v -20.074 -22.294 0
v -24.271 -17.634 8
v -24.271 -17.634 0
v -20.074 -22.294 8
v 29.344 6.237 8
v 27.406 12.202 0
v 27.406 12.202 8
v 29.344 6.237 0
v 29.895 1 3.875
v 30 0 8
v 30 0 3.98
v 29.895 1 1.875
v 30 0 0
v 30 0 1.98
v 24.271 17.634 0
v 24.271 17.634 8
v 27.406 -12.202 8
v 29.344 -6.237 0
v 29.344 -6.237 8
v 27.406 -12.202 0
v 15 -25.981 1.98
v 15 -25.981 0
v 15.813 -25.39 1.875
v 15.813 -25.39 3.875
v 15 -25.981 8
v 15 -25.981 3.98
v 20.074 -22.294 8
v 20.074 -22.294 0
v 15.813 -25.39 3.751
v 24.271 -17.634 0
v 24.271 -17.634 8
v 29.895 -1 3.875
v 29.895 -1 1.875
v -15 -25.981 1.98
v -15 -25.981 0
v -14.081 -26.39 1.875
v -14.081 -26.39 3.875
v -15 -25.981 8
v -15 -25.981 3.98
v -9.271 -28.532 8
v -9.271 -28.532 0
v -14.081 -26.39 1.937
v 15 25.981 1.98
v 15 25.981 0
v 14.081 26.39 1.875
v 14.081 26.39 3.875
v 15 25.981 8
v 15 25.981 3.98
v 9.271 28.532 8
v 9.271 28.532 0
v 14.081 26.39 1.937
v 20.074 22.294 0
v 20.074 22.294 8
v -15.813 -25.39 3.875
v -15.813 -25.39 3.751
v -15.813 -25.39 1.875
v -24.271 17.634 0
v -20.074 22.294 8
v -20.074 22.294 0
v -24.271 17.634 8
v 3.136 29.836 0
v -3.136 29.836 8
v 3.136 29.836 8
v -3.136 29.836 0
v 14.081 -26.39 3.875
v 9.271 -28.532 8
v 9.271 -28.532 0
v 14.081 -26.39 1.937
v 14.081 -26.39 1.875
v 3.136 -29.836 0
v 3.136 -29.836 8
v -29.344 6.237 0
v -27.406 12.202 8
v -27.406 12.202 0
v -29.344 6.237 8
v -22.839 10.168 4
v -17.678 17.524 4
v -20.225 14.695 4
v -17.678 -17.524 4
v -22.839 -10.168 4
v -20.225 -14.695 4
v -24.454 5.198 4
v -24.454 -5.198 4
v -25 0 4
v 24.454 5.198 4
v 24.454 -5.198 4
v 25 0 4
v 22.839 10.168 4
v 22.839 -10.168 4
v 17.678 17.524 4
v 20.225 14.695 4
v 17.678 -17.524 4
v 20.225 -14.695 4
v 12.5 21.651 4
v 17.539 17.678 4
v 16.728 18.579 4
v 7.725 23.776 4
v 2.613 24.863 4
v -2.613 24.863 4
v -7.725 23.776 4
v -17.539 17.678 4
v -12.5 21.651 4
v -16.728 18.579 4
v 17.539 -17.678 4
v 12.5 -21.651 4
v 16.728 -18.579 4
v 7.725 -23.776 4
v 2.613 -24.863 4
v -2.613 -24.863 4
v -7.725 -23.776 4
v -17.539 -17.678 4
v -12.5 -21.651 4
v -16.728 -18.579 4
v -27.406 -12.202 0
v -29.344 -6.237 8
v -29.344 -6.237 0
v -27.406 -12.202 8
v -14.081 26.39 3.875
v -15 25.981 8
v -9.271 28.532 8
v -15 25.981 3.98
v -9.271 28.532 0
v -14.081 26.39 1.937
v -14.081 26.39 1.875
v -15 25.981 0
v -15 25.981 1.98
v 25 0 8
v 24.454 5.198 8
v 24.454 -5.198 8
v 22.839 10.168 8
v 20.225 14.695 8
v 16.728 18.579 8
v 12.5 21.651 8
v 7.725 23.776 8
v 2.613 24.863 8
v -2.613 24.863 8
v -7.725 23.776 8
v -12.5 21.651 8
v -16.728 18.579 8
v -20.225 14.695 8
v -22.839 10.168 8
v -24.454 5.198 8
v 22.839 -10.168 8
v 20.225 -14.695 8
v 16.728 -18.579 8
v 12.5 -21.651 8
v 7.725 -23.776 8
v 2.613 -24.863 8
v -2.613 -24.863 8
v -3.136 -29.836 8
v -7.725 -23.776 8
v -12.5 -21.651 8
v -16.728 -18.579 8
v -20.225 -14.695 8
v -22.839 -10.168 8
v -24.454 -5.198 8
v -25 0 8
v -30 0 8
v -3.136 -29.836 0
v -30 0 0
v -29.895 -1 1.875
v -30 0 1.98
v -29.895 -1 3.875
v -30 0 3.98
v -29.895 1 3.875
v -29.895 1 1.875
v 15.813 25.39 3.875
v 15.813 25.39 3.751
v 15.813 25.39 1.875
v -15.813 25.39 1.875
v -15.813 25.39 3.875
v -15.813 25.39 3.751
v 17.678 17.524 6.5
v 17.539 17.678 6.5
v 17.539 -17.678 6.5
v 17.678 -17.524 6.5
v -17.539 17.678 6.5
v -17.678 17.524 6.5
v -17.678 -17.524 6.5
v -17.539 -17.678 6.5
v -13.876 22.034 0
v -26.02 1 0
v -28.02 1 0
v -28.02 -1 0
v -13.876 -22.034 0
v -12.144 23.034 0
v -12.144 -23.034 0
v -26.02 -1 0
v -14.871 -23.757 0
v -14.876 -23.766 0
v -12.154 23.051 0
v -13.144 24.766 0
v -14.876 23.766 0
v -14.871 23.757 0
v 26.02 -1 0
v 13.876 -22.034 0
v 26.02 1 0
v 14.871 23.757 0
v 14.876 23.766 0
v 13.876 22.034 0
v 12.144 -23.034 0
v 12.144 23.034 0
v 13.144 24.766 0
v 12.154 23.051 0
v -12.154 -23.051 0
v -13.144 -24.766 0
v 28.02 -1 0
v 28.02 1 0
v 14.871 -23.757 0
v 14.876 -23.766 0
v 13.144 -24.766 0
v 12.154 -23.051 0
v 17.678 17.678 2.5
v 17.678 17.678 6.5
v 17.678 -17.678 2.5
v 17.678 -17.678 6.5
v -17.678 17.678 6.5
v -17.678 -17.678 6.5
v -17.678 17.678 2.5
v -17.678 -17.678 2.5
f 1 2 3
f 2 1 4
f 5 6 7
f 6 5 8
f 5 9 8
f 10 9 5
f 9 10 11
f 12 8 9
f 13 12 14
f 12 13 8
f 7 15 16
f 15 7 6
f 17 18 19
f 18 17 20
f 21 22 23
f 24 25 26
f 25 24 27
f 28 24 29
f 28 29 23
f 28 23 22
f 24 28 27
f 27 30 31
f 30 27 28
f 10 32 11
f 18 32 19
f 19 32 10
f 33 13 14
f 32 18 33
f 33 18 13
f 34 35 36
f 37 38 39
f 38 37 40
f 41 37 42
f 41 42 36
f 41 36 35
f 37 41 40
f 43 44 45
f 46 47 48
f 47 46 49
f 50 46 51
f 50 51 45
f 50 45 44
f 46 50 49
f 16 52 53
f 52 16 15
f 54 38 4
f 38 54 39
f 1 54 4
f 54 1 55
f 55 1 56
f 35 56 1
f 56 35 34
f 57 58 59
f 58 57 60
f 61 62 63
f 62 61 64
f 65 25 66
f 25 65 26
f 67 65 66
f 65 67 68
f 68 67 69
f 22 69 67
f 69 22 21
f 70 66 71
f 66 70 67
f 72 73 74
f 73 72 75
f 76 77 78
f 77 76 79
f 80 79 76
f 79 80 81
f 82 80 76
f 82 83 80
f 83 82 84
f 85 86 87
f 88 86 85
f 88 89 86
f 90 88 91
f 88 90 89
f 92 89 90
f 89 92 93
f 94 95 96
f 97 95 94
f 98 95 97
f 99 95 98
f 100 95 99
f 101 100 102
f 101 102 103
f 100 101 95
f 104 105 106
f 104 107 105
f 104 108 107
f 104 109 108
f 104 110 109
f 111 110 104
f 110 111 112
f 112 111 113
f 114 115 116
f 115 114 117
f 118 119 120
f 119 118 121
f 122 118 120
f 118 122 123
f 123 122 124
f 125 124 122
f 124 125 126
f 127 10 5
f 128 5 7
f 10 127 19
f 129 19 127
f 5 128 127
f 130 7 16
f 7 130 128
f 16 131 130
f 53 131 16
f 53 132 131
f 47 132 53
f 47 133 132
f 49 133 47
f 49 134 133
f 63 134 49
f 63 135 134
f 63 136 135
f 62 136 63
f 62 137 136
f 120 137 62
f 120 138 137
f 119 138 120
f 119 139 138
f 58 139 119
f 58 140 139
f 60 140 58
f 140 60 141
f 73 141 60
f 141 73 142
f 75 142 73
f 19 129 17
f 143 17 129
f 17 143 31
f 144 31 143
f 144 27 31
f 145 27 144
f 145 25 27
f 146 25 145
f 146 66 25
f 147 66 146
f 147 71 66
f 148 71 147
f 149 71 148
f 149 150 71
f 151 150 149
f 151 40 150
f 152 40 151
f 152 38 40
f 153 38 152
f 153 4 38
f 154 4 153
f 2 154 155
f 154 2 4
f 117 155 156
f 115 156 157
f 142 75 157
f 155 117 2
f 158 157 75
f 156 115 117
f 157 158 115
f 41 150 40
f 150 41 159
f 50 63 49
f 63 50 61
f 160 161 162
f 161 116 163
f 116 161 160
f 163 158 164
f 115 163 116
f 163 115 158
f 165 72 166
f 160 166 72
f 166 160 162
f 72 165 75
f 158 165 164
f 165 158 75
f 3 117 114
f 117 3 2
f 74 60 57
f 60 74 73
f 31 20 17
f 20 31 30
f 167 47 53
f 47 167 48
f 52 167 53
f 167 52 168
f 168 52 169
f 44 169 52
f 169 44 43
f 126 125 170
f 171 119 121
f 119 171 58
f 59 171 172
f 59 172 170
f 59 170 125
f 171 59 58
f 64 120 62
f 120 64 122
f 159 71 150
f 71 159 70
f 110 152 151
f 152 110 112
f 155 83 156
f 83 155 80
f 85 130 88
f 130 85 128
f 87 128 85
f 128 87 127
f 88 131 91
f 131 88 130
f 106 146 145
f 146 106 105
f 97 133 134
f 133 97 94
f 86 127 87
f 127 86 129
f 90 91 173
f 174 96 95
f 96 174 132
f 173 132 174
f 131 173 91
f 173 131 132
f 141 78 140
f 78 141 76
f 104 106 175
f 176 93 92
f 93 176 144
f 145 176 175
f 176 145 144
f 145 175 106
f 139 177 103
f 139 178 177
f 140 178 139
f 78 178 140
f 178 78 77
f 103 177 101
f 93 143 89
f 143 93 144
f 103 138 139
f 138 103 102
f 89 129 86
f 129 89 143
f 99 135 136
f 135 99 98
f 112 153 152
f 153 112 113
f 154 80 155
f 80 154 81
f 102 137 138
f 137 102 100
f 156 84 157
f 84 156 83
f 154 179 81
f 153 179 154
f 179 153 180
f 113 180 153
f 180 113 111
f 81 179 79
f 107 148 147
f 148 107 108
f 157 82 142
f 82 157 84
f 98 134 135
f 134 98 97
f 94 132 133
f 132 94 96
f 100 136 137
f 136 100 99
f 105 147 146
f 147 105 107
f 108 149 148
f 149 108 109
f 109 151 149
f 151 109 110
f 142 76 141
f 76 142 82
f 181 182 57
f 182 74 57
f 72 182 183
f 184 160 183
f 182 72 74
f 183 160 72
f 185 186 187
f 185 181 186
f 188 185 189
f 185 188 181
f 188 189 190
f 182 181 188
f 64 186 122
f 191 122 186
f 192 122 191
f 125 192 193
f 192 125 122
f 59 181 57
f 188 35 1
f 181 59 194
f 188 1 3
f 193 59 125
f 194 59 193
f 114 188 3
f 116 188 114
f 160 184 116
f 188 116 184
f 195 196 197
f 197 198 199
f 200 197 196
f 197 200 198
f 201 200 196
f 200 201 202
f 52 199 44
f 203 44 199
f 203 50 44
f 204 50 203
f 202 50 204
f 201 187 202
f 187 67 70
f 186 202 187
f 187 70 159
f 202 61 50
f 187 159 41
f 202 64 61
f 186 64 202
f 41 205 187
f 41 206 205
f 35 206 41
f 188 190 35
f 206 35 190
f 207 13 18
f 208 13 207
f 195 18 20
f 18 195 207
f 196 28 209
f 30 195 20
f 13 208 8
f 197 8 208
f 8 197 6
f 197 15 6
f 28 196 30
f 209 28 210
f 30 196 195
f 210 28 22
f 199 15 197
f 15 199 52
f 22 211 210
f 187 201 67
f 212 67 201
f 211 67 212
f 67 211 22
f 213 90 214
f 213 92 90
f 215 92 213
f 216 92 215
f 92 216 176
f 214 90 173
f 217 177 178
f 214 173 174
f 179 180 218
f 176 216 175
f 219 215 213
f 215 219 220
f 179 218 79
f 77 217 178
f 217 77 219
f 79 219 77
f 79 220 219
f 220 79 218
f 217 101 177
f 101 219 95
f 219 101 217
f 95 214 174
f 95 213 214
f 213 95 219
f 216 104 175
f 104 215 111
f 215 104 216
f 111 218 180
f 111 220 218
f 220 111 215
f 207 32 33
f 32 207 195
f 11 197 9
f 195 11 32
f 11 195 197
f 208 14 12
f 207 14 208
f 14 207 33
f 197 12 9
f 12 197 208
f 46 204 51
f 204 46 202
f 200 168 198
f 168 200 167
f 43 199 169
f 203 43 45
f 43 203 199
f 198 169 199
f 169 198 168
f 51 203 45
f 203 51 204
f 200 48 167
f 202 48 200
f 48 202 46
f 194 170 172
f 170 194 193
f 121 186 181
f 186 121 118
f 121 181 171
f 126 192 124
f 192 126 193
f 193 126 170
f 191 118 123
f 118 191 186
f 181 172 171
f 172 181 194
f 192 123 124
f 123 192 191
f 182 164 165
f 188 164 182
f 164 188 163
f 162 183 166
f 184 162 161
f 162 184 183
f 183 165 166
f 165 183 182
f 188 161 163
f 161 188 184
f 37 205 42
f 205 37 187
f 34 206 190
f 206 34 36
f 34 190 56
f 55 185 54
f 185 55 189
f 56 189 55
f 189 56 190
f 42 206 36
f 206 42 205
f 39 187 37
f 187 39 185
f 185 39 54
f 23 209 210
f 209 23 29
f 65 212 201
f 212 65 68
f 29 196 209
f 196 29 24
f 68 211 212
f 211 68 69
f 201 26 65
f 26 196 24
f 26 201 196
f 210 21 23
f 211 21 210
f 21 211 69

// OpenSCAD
// file: ../src/util.scad
//Данная функция корректно смещает slc_ear и sqr_ear 
//под нужный радиус окружности.
module radiused(radius,offset) {
    ystate = sqrt(radius*radius - offset*offset);
    translate([0,ystate,0]) children(0);
}

module linear_array(length, total) {
    for(x = [0:length/(total - 1):length])
        translate([x,0,0]) children(0);
}

module mirror_copy(vector) {
    union() {
        mirror(vector) children(0);
        children(0);
    }
}
// file: ../src/symbol.scad
//Данный модуль строит 3д символ компании (image/symbol.png) 
module symbol(x,y,z) {
    symbol_file = "../image/symbol.png";
    symbol_x = 100;
    symbol_y = 100;
    
    scale([1/symbol_x*x,1/symbol_y*y,1/100*z])
    translate([0,0,100])
    surface(file=symbol_file, invert=true,center=true);
}

//Демонстрационный код.
//symbol(40,40,10);
// file: ../src/rim.scad
module rim(externalRadius,internalRadius,height) {
    difference() {
        cylinder(r=externalRadius, h=height);
        cylinder(r=internalRadius, h=height+1);
    }
}

//Демонстрационный код.
//based_rim(30, 25, 8, 3);
// file: ../src/ear.scad
include <util.scad>

//Угловатое квадратное ухо.
//"w" - толщина уха
module sqr_ear(y,x,w,h) {
    translate([-y/2,0,0])
    difference() {
        cube([y,x,h]);
        translate([w,0,0]) cube([y-w*2,x-w,h]);
    }
}

//Ухо со сглаженными углами.
//"y" - должен быть больше чем "x".
//"w" - толщина уха
module slc_ear(y,x,w,h){
    rotate([0,0,90])
    translate([0,-y/2,0])
    linear_extrude(height=h)
    polygon([
    [0,0],
    [x/2,0],
    [x,x/2],
    [x,y-x/2],
    [x/2,y],
    [0,y],
    [0,y - w],
    [x/2 - w * sin(45/2),y - w],
    [x - w * sin(45/2*3),y -x/2 - w * cos(45/2*3)],
    [x - w * sin(45/2*3),x/2 + w * cos(45/2*3)],
    [x/2 - w * sin(45/2),w],
    [0,w],
    ]);       
}

//Ухо в виде ободка.
module rim_ears(er,ir,iir,w,h,n) {
    union() {
        difference() {
            cylinder(r=er, h=h);
            translate([0,0,-0.005])cylinder(r=ir, h=h+0.01*h);
        }
        difference() {
            for(fi = [0 : 360/n : 359]) 
            rotate([0,0,fi])
            translate([0,-w/2,0])cube([ir,w,h]);
            translate([0,0,-0.005])cylinder(r=iir,h=h+0.01*h);
        }
    }
}

//Инверсная болванка для выреза "скрытого уха".
module hide_ear(earSz) {
    translate([-2*earSz,earSz/2,0])
    rotate([90,0,0])
    linear_extrude(height = earSz)
    polygon([
    [0,-0.01*earSz],
    [earSz,-0.01*earSz],
    [2*earSz+0.01*earSz,earSz],
    [2*earSz+0.01*earSz,2*earSz],
    ]);  
}

//Демонстрационный код:
//  Массив sqr_ear.
/*for(fi = [0 : 60 : 359]) 
    rotate([0,0,fi])
    radiused(30,10) sqr_ear(10,6,2,3);*/
//linear_array(100,4) sqr_ear(10,6,2,3);

//  Массив slc_ear.
/*for(fi = [0 : 60 : 359]) 
    rotate([0,0,fi])
    radiused(30,10) slc_ear(10,6,2,3);*/

//  Круговое ухо (rim_ears).
//rim_ears(40,35,30,4,3,8);

//  Под вырезы в модели (hide_ear).
//for(fi = [0 : 360/6 : 359])
//   rotate([0,0,fi])
//   translate([30,0,0])hide_ear(2);
// main file
include<../src/ear.scad>
include<../src/rim.scad>
include<../src/symbol.scad>

extRad=30;                  //Внешний радиус
intRad=25;                  //Внутренний радиус обода
rimHeight = 4;              //Высота обода (отсчитывается от базы).
baseHeight = 4;             //Высота базы.
symbSize = intRad*sqrt(2);  //Размер стороны внутреннего квадрата.
symbLevel = 2.5;            //Уровень квадрата.
symbHeight = 5;             //Высота символа.
earsTotal = 6;              //Количество ушей.

difference() {
    union() {
        difference(){
            union() {
                translate([0,0,baseHeight])
                    rim(externalRadius=extRad,internalRadius=intRad,height=rimHeight);
                cylinder(r=extRad,h=baseHeight);
            }
        
            translate([-symbSize/2,-symbSize/2,symbLevel])
                cube([symbSize,symbSize,rimHeight]);
        }
        translate([0,0,symbLevel])
            symbol(symbSize,symbSize,symbHeight);
    }

    for(fi = [0 : 360/ earsTotal : 359])
       rotate([0,0,fi])
            translate([extRad,0,0])hide_ear(2);
}
